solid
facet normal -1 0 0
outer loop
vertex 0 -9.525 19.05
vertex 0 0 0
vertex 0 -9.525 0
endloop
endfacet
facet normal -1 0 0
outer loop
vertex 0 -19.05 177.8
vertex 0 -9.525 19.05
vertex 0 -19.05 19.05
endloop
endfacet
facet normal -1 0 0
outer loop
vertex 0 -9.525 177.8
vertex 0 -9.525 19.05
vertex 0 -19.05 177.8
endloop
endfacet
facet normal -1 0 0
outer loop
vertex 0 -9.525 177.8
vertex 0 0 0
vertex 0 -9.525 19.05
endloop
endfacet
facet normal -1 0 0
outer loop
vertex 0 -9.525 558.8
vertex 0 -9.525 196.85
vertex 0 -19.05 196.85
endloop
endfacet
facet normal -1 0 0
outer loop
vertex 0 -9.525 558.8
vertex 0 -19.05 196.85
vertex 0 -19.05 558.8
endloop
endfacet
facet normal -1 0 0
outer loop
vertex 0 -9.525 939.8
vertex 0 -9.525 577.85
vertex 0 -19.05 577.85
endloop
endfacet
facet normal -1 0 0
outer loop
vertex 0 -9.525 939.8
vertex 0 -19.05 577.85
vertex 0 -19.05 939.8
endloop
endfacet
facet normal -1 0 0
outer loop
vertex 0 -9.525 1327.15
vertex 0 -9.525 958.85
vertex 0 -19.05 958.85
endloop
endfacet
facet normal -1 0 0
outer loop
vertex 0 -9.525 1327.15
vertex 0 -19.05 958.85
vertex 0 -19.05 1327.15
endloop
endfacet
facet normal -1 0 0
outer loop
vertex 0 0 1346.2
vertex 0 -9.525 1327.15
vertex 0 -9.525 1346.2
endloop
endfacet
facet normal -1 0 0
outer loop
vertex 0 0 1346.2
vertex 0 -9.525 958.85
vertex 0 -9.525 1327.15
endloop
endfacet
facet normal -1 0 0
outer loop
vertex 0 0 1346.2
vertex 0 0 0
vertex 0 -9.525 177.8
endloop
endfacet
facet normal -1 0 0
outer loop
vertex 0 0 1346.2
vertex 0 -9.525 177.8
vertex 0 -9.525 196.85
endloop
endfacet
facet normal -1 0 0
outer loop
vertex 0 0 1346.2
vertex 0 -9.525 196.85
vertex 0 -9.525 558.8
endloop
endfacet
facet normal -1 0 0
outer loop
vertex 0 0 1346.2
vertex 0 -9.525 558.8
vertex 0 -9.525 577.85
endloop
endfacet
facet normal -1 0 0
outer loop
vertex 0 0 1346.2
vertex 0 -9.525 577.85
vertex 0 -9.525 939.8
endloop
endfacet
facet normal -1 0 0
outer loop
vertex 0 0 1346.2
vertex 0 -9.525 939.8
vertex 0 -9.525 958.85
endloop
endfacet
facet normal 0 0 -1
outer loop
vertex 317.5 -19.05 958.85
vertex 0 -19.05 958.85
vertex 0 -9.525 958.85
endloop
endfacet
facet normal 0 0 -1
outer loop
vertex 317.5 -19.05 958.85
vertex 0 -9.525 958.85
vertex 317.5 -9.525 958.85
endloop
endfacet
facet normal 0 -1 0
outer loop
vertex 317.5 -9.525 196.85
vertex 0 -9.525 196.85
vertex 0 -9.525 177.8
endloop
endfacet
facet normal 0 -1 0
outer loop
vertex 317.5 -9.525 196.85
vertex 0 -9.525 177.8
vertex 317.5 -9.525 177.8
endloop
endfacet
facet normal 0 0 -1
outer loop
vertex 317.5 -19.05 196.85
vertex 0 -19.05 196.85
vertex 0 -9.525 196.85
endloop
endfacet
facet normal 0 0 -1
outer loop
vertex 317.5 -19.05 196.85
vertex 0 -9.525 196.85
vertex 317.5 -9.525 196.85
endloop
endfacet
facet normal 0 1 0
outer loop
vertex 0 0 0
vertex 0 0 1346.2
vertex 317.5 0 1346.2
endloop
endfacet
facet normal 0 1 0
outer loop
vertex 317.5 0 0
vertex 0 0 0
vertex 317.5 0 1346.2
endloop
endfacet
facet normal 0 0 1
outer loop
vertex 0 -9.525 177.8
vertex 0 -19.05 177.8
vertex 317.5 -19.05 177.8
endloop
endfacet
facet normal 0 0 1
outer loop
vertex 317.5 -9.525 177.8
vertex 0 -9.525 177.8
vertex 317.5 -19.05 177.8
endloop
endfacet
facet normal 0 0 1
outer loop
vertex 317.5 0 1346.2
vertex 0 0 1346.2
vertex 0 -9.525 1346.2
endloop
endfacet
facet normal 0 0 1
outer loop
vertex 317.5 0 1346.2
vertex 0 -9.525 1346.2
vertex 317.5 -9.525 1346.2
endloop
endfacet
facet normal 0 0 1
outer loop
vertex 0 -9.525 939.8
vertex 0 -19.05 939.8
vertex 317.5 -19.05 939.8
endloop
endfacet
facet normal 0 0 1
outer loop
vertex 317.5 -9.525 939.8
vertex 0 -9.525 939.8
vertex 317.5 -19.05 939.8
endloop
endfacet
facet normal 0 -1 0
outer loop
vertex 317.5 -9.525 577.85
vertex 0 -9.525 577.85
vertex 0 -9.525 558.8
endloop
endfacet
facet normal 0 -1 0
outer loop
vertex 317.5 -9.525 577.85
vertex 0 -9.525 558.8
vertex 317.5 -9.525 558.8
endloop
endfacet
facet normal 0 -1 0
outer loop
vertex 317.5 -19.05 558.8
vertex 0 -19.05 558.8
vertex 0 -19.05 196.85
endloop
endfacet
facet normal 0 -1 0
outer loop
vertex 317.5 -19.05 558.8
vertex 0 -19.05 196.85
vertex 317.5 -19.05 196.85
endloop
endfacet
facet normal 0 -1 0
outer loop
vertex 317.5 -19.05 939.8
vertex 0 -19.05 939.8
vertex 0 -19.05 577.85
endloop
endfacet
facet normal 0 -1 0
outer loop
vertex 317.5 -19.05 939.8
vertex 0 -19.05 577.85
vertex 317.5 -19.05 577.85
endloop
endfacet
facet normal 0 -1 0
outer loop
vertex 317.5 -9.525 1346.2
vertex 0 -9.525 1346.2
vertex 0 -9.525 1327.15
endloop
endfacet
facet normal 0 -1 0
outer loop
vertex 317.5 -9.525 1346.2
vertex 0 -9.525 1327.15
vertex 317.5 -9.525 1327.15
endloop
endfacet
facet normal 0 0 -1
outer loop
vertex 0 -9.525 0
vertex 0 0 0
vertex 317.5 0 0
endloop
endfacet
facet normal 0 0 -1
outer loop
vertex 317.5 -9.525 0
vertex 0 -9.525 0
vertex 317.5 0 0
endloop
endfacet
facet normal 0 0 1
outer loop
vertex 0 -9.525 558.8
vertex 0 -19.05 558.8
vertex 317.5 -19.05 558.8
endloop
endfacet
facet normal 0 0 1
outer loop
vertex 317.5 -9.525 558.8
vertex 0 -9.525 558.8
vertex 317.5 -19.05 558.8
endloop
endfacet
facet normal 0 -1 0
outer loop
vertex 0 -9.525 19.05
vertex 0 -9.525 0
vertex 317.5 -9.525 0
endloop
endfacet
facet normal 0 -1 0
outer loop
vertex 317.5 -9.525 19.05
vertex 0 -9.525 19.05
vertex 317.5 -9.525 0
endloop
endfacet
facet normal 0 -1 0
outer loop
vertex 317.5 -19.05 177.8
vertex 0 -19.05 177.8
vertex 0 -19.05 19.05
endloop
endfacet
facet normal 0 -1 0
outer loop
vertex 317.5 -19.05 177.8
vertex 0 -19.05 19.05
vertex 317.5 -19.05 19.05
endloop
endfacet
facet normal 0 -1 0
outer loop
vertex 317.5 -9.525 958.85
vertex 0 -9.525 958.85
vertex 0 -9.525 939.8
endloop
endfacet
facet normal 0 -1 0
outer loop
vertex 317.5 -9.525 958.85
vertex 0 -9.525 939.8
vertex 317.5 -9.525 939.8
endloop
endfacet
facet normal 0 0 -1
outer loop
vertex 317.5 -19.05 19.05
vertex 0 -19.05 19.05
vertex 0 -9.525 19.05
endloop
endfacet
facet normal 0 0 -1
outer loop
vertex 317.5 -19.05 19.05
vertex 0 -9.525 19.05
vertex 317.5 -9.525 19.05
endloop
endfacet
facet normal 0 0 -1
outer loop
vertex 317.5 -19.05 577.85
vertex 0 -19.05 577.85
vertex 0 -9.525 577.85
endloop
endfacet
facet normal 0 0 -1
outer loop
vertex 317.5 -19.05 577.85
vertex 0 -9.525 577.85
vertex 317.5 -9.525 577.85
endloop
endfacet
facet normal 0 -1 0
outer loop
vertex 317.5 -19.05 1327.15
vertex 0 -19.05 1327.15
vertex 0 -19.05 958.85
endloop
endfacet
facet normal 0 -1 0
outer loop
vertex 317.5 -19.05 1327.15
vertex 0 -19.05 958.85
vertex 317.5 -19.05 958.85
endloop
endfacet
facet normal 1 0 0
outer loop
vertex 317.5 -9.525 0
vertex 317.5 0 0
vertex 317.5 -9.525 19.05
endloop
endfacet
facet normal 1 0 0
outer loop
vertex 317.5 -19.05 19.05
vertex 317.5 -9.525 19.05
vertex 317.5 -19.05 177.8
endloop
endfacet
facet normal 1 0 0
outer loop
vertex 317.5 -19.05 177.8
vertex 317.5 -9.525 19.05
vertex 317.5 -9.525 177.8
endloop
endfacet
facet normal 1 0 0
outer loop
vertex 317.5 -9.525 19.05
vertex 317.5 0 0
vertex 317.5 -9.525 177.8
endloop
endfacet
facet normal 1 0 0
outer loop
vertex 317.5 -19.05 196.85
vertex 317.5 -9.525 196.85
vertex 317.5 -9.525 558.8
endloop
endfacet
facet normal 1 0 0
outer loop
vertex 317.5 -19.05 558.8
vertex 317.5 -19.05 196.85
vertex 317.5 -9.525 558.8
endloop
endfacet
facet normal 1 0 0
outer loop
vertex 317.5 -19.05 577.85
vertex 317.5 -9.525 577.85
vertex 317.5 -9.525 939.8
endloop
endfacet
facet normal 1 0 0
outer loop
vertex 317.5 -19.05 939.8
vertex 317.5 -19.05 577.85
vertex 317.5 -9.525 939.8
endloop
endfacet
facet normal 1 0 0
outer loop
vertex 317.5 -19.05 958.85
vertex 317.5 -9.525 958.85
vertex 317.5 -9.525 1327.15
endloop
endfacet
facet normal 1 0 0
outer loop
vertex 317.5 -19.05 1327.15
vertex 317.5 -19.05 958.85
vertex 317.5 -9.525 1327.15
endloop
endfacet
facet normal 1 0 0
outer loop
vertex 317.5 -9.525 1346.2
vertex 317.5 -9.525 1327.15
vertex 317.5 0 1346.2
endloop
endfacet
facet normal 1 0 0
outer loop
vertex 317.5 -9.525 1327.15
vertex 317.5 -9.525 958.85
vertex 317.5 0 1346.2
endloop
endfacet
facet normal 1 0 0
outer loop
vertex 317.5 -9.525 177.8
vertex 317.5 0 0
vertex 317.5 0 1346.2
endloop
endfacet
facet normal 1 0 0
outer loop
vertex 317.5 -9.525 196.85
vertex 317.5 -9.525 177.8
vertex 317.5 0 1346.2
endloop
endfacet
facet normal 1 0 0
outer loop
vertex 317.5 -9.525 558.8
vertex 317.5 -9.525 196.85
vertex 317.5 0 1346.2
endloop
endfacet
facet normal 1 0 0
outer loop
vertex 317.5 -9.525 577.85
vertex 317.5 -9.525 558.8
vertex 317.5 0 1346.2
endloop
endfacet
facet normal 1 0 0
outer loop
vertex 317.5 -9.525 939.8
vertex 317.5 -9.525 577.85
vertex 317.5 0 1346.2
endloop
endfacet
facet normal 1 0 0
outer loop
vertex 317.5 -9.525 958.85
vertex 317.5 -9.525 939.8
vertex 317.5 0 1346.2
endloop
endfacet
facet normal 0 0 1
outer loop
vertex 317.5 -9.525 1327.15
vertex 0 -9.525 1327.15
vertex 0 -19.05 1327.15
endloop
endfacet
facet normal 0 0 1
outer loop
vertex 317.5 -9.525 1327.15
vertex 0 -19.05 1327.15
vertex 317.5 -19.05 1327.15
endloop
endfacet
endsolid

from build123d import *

# Parameters (mm, degrees)
F0_W      = 317.5
F0_H      = 1346.2
F1_DEPTH  = 19.05
F2_W      = 317.5
F2_H      = 9.525
F3_DEPTH  = 19.05
F4_W      = 317.5
F4_H      = 9.525
F5_DEPTH  = 19.05
F6_W      = 317.5
F6_H      = 19.05
F7_DEPTH  = 9.525
F8_W      = 317.5
F8_H      = 19.05
F9_DEPTH  = 9.525
F10_W     = 317.5
F10_H     = 19.05
F11_DEPTH = 9.525


with BuildPart() as f1:
    # F0 (on Front) → F1 (new body)
    with BuildSketch(Plane.XZ):
        with Locations((158.75, 673.1)):
            Rectangle(F0_W, F0_H)
    extrude(amount=F1_DEPTH)

    # F2 (on face) → F3 (cut)
    with BuildSketch(Plane.XY.offset(1346.2)):
        with Locations((158.75, -14.2875)):
            Rectangle(F2_W, F2_H)
    extrude(amount=-F3_DEPTH, mode=Mode.SUBTRACT)

    # F4 (on face) → F5 (cut)
    with BuildSketch(Plane(origin=(0, 0, 0), x_dir=(1, 0, 0), z_dir=(0, 0, -1))):
        with Locations((158.75, 14.2875)):
            Rectangle(F4_W, F4_H)
    extrude(amount=-F5_DEPTH, mode=Mode.SUBTRACT)

    # F6 (on face) → F7 (cut)
    with BuildSketch(Plane.XZ.offset(19.05)):
        with Locations((158.75, 187.325)):
            Rectangle(F6_W, F6_H)
    extrude(amount=-F7_DEPTH, mode=Mode.SUBTRACT)

    # F8 (on face) → F9 (cut)
    with BuildSketch(Plane.XZ.offset(19.05)):
        with Locations((158.75, 568.325)):
            Rectangle(F8_W, F8_H)
    extrude(amount=-F9_DEPTH, mode=Mode.SUBTRACT)

    # F10 (on face) → F11 (cut)
    with BuildSketch(Plane.XZ.offset(19.05)):
        with Locations((158.75, 949.325)):
            Rectangle(F10_W, F10_H)
    extrude(amount=-F11_DEPTH, mode=Mode.SUBTRACT)


solid = f1.part
